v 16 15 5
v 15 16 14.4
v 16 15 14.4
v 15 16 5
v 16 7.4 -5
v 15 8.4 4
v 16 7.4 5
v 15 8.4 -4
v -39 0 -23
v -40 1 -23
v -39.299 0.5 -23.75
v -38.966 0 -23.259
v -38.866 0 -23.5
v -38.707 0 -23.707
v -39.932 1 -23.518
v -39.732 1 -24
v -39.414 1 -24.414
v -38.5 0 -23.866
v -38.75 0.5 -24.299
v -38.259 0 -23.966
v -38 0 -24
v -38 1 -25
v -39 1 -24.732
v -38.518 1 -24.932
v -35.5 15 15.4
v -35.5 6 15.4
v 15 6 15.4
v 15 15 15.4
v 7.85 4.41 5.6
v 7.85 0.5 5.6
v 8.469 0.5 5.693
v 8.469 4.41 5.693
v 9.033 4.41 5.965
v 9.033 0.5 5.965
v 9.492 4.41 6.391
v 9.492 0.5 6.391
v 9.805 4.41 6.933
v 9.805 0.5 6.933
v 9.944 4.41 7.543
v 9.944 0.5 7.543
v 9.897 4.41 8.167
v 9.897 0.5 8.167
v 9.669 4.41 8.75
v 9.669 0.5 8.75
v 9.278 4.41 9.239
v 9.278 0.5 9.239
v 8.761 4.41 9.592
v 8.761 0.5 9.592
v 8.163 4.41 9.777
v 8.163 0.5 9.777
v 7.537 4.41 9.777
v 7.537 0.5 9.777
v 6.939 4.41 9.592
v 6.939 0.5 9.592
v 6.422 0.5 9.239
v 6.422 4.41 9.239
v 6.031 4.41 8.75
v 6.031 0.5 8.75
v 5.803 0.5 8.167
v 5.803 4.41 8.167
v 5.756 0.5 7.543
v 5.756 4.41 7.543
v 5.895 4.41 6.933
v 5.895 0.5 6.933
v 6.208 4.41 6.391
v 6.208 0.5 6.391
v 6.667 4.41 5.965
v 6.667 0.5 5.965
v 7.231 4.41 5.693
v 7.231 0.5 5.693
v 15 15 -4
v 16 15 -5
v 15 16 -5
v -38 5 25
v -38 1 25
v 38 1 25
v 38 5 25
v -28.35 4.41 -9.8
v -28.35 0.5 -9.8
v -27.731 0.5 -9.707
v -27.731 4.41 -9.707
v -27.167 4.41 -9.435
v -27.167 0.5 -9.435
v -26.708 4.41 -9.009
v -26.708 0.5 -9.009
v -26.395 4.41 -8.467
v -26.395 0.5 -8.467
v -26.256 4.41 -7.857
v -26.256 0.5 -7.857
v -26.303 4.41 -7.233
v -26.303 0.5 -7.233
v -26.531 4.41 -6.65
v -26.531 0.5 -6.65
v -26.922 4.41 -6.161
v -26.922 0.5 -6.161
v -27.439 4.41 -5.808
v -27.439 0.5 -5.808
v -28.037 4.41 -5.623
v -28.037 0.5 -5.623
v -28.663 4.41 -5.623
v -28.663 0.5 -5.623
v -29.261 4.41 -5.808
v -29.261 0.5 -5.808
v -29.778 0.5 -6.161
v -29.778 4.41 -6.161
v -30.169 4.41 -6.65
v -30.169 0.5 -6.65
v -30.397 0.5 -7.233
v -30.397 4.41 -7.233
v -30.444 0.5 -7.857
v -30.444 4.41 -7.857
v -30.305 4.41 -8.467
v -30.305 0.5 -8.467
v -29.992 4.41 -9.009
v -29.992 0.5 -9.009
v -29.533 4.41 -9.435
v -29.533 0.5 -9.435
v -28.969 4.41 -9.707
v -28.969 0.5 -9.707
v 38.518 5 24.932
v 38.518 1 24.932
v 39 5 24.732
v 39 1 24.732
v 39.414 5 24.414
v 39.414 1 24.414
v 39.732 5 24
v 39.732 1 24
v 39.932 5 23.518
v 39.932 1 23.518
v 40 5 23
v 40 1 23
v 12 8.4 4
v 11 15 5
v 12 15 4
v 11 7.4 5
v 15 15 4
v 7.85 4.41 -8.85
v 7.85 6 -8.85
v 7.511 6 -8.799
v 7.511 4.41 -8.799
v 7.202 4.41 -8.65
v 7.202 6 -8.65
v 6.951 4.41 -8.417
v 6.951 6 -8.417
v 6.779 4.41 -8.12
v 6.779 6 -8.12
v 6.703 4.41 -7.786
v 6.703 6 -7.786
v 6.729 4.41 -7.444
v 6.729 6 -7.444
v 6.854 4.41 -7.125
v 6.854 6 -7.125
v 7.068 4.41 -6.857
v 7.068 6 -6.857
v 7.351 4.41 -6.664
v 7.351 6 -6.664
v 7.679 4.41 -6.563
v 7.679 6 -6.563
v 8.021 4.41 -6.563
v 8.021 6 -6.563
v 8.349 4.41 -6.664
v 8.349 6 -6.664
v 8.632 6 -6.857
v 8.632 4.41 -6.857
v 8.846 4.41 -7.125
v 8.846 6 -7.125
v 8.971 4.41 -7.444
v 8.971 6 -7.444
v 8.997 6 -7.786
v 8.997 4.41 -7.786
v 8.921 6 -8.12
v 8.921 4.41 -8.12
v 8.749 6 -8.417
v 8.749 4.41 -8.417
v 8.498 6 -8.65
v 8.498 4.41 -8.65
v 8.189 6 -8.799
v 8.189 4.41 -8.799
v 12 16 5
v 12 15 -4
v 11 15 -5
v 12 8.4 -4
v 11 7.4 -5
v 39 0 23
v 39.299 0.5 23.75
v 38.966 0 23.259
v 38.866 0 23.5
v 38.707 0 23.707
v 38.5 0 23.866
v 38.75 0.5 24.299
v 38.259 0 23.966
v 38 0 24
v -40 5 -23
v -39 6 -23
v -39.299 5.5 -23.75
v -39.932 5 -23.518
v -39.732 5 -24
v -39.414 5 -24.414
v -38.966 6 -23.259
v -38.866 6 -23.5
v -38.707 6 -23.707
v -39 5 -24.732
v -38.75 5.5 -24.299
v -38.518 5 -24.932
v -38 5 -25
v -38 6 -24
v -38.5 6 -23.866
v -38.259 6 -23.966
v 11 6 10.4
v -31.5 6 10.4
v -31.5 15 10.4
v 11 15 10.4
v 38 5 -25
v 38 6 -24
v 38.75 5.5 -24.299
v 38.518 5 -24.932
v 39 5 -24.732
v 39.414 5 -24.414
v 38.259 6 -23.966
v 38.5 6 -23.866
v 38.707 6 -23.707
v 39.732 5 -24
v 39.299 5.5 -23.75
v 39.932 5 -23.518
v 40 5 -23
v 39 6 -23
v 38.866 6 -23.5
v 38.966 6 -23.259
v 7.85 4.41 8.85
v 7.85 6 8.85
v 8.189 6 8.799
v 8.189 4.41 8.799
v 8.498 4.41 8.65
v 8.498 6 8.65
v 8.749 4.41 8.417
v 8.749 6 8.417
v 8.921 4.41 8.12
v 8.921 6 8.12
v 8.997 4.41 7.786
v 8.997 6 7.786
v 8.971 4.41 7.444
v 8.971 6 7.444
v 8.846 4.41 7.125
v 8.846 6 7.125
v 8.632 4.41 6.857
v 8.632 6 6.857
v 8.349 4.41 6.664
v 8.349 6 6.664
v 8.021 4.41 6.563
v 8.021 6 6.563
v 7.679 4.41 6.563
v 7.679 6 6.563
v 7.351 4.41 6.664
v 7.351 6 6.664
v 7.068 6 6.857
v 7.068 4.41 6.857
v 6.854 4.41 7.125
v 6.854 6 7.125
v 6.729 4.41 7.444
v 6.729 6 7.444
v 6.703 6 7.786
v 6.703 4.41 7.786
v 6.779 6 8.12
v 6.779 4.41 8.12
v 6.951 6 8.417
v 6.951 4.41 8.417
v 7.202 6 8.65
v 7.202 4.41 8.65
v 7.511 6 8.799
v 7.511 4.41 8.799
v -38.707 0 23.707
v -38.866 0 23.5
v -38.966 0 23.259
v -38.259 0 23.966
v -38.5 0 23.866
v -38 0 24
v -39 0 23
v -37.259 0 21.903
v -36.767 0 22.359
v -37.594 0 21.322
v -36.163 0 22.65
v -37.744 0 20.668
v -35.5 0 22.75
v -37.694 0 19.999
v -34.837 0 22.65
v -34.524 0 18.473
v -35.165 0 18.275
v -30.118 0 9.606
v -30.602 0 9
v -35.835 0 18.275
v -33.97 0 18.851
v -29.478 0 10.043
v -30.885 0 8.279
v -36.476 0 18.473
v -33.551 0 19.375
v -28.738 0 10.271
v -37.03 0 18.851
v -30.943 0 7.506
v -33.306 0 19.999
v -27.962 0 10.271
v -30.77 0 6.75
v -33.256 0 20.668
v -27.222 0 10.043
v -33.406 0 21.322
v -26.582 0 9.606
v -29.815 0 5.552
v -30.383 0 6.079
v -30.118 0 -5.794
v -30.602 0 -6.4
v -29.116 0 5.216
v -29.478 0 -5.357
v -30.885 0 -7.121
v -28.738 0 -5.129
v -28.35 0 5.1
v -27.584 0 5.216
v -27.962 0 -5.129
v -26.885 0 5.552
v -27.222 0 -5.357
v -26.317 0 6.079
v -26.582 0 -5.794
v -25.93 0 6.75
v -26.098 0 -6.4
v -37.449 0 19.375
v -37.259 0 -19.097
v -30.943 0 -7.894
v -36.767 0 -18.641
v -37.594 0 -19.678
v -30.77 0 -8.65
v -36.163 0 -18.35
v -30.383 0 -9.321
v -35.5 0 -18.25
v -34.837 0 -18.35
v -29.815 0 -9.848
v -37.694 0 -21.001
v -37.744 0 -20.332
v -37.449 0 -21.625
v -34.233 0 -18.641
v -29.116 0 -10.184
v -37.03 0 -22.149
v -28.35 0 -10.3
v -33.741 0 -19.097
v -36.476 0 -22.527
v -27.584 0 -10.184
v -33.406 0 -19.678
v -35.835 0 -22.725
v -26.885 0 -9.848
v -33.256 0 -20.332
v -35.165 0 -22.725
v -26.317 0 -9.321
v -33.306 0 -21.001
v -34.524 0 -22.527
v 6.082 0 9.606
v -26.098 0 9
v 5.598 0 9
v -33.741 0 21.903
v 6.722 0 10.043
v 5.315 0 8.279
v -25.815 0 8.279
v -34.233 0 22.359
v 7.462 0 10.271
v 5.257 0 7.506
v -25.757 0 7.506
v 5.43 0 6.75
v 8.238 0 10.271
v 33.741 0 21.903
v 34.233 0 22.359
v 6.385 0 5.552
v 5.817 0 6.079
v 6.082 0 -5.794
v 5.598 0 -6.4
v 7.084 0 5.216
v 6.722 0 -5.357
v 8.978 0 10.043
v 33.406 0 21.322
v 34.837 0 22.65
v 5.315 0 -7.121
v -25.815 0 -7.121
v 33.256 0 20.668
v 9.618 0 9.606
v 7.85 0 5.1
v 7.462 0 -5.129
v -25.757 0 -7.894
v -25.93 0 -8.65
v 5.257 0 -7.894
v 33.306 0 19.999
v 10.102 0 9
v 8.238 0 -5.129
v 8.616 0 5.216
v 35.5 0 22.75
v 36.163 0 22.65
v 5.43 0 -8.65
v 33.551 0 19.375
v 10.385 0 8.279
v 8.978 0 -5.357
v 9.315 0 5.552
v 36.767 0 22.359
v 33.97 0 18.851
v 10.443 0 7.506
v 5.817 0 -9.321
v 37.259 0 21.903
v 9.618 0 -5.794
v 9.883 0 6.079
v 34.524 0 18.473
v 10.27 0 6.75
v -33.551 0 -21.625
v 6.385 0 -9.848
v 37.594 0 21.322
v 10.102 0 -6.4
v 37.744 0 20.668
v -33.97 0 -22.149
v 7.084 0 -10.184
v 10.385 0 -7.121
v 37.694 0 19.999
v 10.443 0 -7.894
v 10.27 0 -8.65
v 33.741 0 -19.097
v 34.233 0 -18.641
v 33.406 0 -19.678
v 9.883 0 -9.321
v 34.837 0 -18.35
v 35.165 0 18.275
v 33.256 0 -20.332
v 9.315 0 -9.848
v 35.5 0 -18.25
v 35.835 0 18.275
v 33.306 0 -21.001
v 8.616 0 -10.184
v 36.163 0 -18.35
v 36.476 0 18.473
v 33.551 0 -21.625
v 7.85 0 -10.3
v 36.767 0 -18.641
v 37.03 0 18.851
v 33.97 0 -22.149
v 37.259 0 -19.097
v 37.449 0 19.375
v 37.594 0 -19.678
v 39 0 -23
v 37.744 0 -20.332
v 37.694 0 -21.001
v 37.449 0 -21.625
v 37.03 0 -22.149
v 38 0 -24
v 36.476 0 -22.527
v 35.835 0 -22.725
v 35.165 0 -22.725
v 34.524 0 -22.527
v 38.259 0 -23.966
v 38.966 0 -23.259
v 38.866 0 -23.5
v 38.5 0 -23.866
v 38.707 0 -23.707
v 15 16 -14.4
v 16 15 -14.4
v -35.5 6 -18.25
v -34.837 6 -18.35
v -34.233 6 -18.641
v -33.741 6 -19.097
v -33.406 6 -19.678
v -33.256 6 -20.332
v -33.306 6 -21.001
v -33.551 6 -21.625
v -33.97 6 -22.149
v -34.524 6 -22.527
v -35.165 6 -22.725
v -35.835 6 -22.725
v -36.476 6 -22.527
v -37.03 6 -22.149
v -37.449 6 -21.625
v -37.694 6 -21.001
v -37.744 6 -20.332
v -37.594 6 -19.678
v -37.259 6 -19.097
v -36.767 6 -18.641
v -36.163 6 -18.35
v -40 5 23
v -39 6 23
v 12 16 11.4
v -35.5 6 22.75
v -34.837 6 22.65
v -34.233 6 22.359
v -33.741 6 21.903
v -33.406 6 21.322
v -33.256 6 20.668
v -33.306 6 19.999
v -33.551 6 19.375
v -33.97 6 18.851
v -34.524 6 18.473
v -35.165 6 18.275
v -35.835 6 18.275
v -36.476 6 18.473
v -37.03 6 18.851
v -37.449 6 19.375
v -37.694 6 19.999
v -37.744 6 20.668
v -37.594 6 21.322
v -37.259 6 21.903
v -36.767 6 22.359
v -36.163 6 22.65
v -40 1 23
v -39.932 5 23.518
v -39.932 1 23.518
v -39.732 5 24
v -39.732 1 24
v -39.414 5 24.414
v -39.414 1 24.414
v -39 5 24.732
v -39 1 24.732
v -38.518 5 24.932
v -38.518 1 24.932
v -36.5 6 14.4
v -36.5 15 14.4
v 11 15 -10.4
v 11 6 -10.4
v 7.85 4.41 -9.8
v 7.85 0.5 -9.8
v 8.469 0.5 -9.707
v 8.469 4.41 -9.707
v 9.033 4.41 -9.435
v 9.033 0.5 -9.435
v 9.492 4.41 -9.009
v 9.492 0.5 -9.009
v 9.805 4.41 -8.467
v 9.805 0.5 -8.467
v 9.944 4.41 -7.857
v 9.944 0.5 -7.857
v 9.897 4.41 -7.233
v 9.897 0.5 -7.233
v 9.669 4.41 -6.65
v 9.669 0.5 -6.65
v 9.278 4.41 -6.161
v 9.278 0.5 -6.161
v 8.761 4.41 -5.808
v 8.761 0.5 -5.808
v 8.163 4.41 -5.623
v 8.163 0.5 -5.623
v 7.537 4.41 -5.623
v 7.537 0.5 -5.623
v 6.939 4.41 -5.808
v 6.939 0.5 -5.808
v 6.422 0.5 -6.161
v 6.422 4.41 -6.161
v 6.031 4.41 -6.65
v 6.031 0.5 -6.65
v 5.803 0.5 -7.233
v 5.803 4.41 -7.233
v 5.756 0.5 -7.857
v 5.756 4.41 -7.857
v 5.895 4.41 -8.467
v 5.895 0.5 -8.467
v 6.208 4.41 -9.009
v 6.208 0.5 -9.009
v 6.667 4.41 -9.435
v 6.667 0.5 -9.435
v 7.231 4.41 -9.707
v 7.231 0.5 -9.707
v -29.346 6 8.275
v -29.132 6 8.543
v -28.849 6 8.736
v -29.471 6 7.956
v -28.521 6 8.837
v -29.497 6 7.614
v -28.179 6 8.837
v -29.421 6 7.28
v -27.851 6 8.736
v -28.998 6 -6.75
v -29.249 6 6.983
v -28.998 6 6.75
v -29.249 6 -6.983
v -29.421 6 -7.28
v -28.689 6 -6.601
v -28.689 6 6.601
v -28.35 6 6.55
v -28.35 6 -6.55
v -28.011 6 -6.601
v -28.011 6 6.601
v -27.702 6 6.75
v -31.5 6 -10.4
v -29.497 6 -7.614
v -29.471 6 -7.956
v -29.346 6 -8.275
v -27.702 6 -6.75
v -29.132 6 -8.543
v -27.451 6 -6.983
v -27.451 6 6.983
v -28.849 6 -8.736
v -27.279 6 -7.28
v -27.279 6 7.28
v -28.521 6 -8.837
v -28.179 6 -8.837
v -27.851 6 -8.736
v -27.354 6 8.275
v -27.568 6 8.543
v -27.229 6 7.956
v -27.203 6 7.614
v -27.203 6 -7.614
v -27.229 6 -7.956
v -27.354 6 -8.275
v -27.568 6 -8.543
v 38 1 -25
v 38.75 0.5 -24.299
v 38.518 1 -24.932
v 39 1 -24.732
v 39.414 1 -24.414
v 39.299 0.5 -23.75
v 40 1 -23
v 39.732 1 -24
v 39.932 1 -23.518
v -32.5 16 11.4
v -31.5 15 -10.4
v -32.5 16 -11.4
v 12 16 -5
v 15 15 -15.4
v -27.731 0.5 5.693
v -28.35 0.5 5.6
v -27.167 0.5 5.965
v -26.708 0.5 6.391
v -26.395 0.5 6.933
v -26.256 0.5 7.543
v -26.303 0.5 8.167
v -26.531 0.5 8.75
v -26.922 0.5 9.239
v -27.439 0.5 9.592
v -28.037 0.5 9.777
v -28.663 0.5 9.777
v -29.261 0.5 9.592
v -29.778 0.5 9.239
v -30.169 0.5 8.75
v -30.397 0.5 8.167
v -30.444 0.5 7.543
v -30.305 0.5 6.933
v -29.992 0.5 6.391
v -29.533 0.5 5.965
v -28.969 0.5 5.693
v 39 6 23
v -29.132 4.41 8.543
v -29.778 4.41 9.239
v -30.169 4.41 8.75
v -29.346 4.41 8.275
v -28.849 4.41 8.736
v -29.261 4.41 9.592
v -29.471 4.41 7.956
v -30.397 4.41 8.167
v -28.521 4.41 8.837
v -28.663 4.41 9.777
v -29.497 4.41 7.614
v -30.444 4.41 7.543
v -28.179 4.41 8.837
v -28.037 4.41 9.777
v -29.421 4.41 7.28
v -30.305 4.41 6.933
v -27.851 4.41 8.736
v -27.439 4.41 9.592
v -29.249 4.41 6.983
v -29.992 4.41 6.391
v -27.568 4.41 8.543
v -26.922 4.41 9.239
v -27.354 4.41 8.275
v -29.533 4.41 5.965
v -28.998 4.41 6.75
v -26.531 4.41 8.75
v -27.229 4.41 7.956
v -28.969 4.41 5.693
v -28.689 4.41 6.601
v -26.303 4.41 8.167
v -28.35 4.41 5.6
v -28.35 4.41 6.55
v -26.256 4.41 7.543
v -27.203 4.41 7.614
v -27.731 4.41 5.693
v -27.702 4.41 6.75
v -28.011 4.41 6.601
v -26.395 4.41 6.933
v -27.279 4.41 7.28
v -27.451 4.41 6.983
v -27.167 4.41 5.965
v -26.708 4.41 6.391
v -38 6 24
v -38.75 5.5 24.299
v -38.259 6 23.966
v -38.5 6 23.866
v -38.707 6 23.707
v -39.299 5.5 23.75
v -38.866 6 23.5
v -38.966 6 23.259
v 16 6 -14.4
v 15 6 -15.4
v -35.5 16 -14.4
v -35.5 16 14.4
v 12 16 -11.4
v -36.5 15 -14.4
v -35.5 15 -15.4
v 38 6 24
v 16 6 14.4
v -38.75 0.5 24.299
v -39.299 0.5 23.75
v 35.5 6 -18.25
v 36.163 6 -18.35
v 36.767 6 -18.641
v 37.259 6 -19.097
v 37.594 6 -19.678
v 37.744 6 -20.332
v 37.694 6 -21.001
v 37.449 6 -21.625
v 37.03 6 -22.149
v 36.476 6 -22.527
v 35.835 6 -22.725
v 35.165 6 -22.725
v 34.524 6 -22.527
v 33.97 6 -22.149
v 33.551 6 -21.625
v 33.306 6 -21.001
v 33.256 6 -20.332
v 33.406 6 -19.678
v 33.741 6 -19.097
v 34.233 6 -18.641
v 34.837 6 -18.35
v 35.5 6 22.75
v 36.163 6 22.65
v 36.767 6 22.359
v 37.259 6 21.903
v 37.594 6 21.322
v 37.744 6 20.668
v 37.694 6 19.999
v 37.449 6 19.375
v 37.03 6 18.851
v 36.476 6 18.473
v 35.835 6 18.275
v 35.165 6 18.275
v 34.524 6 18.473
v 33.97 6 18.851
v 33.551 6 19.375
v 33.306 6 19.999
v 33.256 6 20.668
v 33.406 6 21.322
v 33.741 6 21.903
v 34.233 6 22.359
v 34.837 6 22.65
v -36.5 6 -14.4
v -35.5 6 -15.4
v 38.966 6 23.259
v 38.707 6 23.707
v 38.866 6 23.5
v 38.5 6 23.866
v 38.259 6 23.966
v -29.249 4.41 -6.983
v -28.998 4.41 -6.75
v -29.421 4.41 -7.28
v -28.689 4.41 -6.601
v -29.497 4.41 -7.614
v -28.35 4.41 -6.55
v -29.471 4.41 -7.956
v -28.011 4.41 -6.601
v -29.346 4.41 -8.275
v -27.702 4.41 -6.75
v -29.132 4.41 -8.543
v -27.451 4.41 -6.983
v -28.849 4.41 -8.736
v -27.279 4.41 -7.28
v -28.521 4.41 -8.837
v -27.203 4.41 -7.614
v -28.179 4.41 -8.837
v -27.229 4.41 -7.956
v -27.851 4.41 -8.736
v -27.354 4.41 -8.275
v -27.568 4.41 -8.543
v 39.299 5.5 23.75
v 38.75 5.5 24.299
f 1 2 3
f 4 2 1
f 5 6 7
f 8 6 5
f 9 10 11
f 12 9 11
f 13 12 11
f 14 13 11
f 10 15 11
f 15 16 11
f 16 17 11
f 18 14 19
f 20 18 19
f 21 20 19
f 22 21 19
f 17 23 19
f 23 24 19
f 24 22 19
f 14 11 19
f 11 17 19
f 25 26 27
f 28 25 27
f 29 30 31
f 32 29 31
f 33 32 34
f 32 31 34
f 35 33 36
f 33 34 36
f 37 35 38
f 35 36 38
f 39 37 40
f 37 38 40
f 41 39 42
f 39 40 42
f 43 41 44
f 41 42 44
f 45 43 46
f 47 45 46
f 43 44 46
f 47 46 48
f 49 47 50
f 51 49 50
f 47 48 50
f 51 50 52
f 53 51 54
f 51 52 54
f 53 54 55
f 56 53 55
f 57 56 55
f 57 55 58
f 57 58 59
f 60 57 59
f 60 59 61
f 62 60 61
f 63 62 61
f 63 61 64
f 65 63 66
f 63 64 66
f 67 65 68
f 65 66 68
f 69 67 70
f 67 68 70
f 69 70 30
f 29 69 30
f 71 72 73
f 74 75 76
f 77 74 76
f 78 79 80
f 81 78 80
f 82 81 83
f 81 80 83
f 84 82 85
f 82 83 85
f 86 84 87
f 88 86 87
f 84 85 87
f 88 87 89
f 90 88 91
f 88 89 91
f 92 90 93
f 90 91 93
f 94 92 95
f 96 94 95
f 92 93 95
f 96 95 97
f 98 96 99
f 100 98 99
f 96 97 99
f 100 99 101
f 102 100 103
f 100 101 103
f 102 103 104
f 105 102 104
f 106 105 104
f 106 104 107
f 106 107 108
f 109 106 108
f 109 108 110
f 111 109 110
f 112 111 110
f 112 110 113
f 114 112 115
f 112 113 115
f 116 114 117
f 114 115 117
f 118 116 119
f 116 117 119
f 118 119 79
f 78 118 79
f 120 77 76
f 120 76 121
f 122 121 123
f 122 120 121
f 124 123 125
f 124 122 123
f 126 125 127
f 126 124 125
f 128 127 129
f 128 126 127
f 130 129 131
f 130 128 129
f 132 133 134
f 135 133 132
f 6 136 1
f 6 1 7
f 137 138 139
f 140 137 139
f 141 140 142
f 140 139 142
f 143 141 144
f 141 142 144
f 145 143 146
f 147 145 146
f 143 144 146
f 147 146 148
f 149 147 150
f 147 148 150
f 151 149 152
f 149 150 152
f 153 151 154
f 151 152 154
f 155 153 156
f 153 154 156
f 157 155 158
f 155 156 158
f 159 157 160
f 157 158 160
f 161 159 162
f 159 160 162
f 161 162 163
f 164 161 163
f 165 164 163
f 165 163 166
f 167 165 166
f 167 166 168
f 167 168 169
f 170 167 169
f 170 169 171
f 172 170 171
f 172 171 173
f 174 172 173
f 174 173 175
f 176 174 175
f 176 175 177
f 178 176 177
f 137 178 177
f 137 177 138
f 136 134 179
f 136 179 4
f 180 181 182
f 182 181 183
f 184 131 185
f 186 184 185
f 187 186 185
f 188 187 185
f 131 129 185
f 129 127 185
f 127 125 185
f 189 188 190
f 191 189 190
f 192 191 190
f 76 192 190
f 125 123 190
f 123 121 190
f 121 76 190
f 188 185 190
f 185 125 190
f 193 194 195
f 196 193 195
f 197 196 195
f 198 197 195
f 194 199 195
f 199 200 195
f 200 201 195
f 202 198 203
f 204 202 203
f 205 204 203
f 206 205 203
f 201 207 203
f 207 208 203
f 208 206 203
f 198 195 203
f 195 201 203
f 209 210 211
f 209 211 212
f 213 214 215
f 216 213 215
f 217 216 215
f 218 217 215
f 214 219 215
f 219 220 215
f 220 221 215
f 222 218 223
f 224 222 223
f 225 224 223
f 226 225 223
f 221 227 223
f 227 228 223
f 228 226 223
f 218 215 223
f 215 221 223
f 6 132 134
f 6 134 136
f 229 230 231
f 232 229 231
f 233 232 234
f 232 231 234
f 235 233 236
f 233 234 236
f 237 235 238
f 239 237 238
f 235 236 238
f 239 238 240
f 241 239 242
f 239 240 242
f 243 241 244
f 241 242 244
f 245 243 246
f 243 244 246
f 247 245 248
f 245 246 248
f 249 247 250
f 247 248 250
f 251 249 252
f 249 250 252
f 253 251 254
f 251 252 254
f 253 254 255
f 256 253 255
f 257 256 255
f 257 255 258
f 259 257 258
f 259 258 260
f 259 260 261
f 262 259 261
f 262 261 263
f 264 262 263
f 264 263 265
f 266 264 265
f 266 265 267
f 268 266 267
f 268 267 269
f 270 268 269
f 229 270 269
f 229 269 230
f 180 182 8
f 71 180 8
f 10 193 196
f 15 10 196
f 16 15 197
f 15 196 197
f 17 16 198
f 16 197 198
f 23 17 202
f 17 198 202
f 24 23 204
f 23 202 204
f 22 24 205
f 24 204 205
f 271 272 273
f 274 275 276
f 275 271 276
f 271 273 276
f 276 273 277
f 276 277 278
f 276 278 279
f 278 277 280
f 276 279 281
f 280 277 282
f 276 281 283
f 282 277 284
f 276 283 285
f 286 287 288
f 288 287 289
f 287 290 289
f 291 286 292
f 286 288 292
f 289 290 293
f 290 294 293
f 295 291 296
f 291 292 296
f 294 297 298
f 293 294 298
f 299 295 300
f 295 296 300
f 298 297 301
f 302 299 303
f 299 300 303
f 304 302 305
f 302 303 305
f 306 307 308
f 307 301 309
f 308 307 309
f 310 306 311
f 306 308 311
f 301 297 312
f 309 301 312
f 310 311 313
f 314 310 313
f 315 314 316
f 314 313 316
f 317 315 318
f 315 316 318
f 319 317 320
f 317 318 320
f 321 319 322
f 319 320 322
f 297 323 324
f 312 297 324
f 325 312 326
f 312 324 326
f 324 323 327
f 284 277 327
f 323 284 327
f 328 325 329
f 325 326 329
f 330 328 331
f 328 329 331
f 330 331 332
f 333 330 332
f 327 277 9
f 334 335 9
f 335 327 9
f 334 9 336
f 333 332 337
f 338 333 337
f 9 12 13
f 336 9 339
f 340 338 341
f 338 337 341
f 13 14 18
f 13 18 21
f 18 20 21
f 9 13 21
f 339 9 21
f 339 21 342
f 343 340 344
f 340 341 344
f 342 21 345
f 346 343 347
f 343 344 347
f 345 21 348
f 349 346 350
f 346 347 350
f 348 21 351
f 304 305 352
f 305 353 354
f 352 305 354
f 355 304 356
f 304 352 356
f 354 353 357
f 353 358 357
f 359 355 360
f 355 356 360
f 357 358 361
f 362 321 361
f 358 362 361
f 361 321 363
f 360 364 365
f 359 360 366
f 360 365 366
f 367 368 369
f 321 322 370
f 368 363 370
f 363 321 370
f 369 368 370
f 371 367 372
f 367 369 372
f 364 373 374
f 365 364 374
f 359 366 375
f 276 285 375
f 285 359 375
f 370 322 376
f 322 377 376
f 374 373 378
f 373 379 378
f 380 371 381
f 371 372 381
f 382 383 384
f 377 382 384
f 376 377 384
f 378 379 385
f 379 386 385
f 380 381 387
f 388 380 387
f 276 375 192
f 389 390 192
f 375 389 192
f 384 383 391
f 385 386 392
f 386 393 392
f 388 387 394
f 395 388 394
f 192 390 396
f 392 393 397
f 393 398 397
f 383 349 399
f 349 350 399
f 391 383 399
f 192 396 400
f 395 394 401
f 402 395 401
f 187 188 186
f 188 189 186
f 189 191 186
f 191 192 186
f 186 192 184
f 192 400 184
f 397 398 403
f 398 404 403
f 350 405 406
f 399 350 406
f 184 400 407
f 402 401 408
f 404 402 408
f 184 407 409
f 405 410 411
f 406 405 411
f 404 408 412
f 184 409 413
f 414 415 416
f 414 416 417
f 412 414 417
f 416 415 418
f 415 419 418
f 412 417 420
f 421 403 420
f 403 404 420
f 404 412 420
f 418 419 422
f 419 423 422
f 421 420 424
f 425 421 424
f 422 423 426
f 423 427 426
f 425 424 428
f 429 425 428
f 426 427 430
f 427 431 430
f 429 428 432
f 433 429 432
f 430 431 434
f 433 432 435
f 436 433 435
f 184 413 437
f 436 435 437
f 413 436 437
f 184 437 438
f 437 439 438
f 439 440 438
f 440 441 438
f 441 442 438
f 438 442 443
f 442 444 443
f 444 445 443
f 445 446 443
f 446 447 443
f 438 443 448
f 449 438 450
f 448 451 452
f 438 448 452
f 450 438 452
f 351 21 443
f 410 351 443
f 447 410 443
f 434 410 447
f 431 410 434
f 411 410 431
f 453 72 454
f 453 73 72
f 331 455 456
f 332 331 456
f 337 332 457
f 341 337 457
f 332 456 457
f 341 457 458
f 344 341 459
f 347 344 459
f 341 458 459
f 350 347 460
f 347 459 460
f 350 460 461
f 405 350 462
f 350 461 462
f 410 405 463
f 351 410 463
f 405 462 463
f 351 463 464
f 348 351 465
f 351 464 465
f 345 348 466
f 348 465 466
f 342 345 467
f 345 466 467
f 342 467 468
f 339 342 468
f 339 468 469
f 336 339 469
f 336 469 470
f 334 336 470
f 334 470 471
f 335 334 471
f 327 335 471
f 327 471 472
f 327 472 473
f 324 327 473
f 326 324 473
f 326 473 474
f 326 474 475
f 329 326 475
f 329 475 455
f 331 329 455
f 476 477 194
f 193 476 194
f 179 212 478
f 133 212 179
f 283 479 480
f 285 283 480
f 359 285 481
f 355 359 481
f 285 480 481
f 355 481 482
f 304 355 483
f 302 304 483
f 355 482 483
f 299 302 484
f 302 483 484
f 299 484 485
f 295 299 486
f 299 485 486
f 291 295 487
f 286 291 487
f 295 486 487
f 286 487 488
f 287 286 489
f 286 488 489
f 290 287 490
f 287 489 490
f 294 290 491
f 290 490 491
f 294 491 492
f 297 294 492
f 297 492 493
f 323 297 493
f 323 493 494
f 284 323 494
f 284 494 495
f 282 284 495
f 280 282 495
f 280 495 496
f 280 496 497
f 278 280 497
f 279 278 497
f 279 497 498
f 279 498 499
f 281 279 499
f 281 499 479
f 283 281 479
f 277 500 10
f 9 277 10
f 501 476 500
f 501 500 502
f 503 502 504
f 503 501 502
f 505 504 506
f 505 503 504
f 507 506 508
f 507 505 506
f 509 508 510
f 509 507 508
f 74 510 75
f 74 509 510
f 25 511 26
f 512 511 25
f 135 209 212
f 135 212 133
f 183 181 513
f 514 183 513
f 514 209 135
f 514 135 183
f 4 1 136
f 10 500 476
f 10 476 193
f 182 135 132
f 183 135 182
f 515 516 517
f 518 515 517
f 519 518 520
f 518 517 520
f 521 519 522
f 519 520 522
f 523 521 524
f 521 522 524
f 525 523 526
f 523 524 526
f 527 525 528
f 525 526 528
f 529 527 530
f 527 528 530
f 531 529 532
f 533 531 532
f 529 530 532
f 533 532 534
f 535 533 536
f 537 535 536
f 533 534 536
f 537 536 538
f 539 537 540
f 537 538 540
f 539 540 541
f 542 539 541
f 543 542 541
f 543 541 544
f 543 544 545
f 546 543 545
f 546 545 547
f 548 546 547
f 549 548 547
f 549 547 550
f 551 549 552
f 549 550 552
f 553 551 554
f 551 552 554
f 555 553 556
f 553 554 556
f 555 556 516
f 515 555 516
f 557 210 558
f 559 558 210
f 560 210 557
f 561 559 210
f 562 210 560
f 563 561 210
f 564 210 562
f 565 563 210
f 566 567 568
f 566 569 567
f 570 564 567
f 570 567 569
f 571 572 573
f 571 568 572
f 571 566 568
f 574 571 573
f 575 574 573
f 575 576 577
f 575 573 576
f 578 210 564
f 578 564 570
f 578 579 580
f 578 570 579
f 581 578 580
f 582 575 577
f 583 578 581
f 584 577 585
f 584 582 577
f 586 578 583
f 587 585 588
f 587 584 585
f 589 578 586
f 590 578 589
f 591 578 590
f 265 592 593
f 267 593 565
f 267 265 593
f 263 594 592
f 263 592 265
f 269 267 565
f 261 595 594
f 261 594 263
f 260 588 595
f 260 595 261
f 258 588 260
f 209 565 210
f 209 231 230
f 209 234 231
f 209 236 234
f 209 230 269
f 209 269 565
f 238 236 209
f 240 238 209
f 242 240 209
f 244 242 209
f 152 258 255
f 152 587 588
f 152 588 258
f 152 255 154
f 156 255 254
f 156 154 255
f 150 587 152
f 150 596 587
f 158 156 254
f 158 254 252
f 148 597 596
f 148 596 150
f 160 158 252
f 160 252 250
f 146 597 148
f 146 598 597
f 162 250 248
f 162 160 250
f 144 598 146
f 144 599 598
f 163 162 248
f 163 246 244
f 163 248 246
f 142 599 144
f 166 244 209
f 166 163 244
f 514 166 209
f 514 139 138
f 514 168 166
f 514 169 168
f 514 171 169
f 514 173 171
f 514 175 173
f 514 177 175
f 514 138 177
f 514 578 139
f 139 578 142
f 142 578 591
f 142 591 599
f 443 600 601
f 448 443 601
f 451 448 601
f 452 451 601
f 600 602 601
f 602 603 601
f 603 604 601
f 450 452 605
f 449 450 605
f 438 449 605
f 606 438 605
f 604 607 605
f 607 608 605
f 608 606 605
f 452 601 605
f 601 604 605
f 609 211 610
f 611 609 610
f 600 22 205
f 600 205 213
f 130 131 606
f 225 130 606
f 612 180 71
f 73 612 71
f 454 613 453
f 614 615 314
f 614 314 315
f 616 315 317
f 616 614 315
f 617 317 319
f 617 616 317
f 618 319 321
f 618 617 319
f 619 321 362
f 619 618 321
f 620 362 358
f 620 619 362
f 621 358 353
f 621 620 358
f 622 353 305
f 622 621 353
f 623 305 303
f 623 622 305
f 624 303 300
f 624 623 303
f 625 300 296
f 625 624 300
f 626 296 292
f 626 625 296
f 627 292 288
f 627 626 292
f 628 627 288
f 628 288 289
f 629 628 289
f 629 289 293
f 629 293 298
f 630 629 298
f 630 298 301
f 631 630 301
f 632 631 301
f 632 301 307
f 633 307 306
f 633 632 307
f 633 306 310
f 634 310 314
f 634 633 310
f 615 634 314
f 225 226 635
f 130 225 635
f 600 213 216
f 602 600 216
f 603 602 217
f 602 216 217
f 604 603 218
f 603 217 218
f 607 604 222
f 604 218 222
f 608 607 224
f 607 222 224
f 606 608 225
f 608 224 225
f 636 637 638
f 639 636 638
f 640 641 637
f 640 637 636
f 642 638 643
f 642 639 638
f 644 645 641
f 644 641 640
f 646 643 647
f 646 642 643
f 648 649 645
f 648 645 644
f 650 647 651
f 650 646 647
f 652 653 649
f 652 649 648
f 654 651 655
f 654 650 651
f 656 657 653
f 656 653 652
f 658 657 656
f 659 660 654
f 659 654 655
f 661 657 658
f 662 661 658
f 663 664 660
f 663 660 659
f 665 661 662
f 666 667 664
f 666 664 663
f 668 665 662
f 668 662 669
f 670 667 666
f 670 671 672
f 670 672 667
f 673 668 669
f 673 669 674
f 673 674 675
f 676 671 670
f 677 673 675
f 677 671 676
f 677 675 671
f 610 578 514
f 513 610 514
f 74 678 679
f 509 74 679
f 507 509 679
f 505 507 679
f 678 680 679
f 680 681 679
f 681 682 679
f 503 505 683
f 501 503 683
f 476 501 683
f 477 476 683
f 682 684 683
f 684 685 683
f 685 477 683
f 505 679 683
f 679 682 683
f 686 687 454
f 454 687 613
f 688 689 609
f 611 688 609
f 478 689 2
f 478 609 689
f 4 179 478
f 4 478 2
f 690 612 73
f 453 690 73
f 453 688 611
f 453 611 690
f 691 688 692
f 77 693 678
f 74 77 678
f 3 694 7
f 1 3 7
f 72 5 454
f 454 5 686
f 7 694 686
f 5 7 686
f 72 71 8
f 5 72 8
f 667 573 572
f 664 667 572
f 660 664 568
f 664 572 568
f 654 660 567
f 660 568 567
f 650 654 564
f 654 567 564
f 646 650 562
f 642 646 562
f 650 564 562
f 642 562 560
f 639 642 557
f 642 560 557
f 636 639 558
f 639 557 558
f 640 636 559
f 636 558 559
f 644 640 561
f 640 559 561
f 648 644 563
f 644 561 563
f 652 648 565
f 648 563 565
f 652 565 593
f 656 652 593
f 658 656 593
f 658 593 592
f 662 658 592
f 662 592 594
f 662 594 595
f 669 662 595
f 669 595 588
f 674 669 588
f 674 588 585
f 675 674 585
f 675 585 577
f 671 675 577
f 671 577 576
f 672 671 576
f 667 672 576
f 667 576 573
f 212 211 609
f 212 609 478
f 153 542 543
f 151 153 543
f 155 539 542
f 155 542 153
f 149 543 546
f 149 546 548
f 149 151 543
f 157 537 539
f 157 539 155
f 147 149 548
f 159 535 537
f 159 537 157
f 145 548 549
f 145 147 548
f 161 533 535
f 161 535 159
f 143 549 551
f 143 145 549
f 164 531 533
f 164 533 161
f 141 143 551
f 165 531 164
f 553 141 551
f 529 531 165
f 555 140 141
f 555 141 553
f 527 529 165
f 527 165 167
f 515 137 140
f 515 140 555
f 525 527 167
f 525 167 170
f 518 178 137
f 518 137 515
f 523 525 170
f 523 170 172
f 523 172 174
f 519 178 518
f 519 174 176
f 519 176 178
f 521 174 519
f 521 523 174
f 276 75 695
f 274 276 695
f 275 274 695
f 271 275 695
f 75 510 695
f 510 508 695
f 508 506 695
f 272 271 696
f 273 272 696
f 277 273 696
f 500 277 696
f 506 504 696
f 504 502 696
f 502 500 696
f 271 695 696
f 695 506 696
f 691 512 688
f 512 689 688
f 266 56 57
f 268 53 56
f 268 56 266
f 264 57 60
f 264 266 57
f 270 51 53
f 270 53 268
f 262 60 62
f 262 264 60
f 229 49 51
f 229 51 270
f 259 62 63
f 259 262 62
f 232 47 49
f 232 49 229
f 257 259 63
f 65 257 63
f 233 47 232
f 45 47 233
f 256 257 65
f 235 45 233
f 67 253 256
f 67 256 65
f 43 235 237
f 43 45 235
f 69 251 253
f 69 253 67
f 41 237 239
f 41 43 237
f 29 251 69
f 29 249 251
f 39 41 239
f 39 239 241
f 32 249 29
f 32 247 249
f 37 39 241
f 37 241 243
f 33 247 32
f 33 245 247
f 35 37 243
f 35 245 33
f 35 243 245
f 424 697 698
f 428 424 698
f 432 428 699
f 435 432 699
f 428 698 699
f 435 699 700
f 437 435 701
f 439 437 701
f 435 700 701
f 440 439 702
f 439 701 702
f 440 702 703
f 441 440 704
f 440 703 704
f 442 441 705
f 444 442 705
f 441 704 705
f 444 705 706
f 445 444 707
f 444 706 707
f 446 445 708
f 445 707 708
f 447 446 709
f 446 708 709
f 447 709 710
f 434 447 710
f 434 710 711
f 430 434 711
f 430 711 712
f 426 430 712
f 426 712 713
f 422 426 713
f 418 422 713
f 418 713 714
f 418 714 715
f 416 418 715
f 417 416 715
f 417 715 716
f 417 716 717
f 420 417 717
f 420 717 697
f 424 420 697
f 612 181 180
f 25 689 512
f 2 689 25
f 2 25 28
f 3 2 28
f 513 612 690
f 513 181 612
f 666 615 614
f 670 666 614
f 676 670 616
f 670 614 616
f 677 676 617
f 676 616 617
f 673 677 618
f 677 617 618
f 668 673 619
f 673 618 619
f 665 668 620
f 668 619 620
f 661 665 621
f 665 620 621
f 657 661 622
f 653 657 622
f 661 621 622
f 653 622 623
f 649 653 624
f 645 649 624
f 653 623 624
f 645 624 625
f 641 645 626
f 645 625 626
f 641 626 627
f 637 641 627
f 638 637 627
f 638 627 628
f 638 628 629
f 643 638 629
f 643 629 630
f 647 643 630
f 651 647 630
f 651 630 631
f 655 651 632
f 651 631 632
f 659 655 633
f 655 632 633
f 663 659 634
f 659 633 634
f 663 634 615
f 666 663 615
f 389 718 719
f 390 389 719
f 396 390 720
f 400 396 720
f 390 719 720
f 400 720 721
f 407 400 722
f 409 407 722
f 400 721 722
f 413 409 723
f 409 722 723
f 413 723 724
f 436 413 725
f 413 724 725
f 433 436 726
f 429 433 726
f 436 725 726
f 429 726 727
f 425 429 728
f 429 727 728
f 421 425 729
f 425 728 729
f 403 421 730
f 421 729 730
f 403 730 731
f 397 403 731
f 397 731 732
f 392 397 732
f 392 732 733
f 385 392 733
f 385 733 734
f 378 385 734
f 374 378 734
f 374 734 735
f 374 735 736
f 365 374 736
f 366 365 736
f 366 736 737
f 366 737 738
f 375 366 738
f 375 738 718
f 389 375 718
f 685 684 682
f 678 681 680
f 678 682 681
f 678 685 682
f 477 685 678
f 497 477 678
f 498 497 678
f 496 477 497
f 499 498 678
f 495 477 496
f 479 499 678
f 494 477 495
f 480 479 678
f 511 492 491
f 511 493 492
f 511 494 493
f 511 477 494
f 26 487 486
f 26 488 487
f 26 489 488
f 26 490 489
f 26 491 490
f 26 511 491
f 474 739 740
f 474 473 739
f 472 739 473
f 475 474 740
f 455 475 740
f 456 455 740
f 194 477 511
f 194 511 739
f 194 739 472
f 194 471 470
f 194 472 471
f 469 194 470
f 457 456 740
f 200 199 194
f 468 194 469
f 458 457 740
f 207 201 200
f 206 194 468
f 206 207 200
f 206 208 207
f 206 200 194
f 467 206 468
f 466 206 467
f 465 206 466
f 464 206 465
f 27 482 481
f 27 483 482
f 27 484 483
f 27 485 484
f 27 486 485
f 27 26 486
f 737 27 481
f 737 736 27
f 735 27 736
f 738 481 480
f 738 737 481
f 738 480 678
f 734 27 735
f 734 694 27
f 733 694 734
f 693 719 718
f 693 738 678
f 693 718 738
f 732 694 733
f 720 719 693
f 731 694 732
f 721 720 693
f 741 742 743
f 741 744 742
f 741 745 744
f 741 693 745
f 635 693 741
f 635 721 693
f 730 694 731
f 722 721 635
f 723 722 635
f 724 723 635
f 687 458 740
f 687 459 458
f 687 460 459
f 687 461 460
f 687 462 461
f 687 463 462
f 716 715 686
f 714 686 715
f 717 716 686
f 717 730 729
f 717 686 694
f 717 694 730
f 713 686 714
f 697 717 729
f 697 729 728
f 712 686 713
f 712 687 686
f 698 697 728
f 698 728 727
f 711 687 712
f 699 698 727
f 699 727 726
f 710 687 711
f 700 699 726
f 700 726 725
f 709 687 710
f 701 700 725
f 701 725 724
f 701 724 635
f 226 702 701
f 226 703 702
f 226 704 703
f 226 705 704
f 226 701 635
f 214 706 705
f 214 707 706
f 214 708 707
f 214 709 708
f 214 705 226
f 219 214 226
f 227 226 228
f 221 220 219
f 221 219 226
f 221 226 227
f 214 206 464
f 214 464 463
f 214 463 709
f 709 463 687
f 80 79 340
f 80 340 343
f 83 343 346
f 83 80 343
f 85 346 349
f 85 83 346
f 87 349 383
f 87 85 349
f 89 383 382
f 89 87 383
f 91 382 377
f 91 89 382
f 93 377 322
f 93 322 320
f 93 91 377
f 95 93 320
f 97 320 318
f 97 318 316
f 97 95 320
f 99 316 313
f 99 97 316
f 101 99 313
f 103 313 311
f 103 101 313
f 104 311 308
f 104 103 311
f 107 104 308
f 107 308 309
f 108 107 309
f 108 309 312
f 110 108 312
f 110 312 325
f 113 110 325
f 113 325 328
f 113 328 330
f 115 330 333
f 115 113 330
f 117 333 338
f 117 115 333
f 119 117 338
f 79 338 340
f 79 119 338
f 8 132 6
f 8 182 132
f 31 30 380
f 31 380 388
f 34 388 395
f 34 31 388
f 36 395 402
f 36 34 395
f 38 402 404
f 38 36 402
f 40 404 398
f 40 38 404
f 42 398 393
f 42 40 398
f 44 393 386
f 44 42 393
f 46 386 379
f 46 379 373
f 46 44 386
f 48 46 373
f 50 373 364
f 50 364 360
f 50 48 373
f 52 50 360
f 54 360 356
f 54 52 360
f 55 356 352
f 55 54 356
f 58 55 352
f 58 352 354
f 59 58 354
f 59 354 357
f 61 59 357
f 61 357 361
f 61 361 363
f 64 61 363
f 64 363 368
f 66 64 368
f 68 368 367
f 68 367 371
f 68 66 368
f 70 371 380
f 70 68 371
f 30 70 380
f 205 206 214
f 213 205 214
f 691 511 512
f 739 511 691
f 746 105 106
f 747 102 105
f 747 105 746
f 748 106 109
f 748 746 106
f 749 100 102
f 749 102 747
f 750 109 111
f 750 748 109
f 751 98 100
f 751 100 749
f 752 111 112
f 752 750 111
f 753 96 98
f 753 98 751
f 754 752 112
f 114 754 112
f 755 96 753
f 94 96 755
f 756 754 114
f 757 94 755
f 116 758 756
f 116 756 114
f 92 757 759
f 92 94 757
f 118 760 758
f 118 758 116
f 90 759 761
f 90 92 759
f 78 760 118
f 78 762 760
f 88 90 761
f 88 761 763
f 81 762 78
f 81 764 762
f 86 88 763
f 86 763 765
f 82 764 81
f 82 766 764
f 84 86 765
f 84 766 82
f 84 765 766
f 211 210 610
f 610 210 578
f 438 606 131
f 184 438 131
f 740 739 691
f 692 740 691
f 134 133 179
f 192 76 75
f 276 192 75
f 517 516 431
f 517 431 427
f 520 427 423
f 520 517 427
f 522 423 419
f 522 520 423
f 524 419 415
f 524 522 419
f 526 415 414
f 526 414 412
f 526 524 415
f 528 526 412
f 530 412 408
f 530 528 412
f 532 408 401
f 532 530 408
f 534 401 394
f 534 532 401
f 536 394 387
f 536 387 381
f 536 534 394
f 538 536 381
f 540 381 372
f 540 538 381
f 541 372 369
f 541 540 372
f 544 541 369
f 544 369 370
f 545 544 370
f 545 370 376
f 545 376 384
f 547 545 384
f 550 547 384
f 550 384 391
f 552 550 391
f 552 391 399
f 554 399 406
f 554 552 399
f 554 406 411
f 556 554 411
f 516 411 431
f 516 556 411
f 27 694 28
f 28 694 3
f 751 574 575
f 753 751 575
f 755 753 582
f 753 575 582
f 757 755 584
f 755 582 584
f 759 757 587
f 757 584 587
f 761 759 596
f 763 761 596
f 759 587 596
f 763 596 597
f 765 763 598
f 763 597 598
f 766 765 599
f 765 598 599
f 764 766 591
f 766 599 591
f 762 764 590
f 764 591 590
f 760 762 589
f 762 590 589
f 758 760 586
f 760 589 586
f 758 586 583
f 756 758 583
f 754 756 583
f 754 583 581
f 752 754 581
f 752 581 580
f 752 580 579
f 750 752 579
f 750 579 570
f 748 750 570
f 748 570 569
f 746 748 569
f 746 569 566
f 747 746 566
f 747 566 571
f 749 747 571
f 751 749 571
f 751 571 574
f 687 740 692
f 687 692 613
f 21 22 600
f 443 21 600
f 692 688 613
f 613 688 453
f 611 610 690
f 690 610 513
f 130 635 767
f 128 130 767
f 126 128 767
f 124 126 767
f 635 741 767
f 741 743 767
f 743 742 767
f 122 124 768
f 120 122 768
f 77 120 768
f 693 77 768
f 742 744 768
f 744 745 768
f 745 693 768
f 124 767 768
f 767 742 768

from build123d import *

# Parameters (mm, degrees)
SKETCH1_W           = 80
SKETCH1_H           = 50
BOSS_EXTRUDE1_DEPTH = 6
SKETCH4_W           = 52.5
SKETCH4_H           = 30.8
SKETCH4_W_2         = 42.5
SKETCH4_H_2         = 20.8
BOSS_EXTRUDE2_DEPTH = 10
SKETCH5_W           = 5
SKETCH5_H           = 8
CUT_EXTRUDE1_DEPTH  = 7.6
SKETCH6_R           = 1.15
CUT_EXTRUDE2_DEPTH  = 49.218253805
SKETCH7_R           = 2.1
CUT_EXTRUDE3_DEPTH  = 4.41
CHAMFER3_SIZE       = 1
CHAMFER4_SIZE       = 0.5
SKETCH8_R           = 2.25
CUT_EXTRUDE4_DEPTH  = 49.218253805
FILLET1_R           = 2
CHAMFER5_SIZE       = 1


with BuildPart() as part:
    # Sketch1 → Boss-Extrude1 (new body)
    with BuildSketch(Plane(origin=(0, 0, 0), x_dir=(1, 0, 0), z_dir=(0, 1, 0))):
        Rectangle(SKETCH1_W, SKETCH1_H)
    extrude(amount=BOSS_EXTRUDE1_DEPTH)

    # Sketch4 → Boss-Extrude2 (add)
    with BuildSketch(Plane(origin=(0, 6, 0), x_dir=(1, 0, 0), z_dir=(0, 1, 0))):
        with Locations((-10.25, 0)):
            Rectangle(SKETCH4_W, SKETCH4_H)
        with Locations((-10.25, 0)):
            Rectangle(SKETCH4_W_2, SKETCH4_H_2, mode=Mode.SUBTRACT)
    extrude(amount=BOSS_EXTRUDE2_DEPTH)

    # Sketch5 → Cut-Extrude1 (cut)
    with BuildSketch(Plane(origin=(0, 16, 0), x_dir=(1, 0, 0), z_dir=(0, 1, 0))):
        with Locations((13.5, 0)):
            Rectangle(SKETCH5_W, SKETCH5_H)
    extrude(amount=-CUT_EXTRUDE1_DEPTH, mode=Mode.SUBTRACT)

    # Sketch6 → Cut-Extrude2 (cut, through all)
    with BuildSketch(Plane(origin=(0, 6, 0), x_dir=(1, 0, 0), z_dir=(0, 1, 0))):
        with Locations(Location((-28.35, 7.7, 0), (0, 0, 270))):
            Circle(SKETCH6_R)
        with Locations(Location((7.85, 7.7, 0), (0, 0, 90))):
            Circle(SKETCH6_R)
        with Locations(Location((7.85, -7.7, 0), (0, 0, 270))):
            Circle(SKETCH6_R)
        with Locations(Location((-28.35, -7.7, 0), (0, 0, 90))):
            Circle(SKETCH6_R)
    extrude(amount=-CUT_EXTRUDE2_DEPTH, mode=Mode.SUBTRACT)

    # Sketch7 → Cut-Extrude3 (cut)
    with BuildSketch(Plane.XZ):
        with Locations(Location((-28.35, 7.7, 0), (0, 0, 270))):
            Circle(SKETCH7_R)
        with Locations(Location((7.85, 7.7, 0), (0, 0, 270))):
            Circle(SKETCH7_R)
        with Locations(Location((-28.35, -7.7, 0), (0, 0, 270))):
            Circle(SKETCH7_R)
        with Locations(Location((7.85, -7.7, 0), (0, 0, 270))):
            Circle(SKETCH7_R)
    extrude(amount=-CUT_EXTRUDE3_DEPTH, mode=Mode.SUBTRACT)

    # Chamfer3
    chamfer3_edges = [part.edges().sort_by_distance(p)[0] for p in [
        (16, 16, 9.7),
        (-10.25, 16, -15.4),
        (-36.5, 16, 0),
        (-10.25, 16, 15.4),
        (16, 11, 15.4),
        (16, 11, -15.4),
        (-36.5, 11, -15.4),
        (-36.5, 11, 15.4),
        (11, 16, 7.2),
        (-10.25, 16, -10.4),
        (-31.5, 16, 0),
        (-10.25, 16, 10.4),
        (11, 16, -7.2),
        (16, 16, -9.7),
        (16, 8.4, 0),
        (16, 12.2, -4),
        (16, 12.2, 4),
        (11, 8.4, 0),
        (11, 12.2, 4),
        (11, 12.2, -4),
        (13.5, 16, -4),
        (13.5, 16, 4),
    ]]
    chamfer(chamfer3_edges, length=CHAMFER3_SIZE)

    # Chamfer4
    chamfer4_edges = [part.edges().sort_by_distance(p)[0] for p in [
        (7.85, 0, 9.8),
        (-28.35, 0, -5.6),
        (7.85, 0, -5.6),
        (-28.35, 0, 9.8),
    ]]
    chamfer(chamfer4_edges, length=CHAMFER4_SIZE)

    # Sketch8 → Cut-Extrude4 (cut, through all)
    with BuildSketch(Plane(origin=(0, 6, 0), x_dir=(1, 0, 0), z_dir=(0, 1, 0))):
        with Locations(Location((-35.5, 20.5, 0), (0, 0, 270))):
            Circle(SKETCH8_R)
        with Locations(Location((35.5, 20.5, 0), (0, 0, 270))):
            Circle(SKETCH8_R)
        with Locations(Location((35.5, -20.5, 0), (0, 0, 270))):
            Circle(SKETCH8_R)
        with Locations(Location((-35.5, -20.5, 0), (0, 0, 270))):
            Circle(SKETCH8_R)
    extrude(amount=-CUT_EXTRUDE4_DEPTH, mode=Mode.SUBTRACT)

    # Fillet1
    fillet1_edges = [part.edges().sort_by_distance(p)[0] for p in [
        (40, 3, 25),
        (-40, 3, 25),
        (-40, 3, -25),
        (40, 3, -25),
    ]]
    fillet(fillet1_edges, radius=FILLET1_R)

    # Chamfer5
    chamfer5_edges = [part.edges().sort_by_distance(p)[0] for p in [
        (-40, 0, 0),
        (-40, 6, 0),
        (40, 0, 0),
        (0, 0, 25),
        (0, 0, -25),
        (-39.414213562, 0, 24.414213562),
        (39.414213562, 0, 24.414213562),
        (39.414213562, 0, -24.414213562),
        (-39.414213562, 0, -24.414213562),
        (0, 6, -25),
        (40, 6, 0),
        (0, 6, 25),
        (-39.414213562, 6, 24.414213562),
        (39.414213562, 6, 24.414213562),
        (39.414213562, 6, -24.414213562),
        (-39.414213562, 6, -24.414213562),
    ]]
    chamfer(chamfer5_edges, length=CHAMFER5_SIZE)


solid = part.part
